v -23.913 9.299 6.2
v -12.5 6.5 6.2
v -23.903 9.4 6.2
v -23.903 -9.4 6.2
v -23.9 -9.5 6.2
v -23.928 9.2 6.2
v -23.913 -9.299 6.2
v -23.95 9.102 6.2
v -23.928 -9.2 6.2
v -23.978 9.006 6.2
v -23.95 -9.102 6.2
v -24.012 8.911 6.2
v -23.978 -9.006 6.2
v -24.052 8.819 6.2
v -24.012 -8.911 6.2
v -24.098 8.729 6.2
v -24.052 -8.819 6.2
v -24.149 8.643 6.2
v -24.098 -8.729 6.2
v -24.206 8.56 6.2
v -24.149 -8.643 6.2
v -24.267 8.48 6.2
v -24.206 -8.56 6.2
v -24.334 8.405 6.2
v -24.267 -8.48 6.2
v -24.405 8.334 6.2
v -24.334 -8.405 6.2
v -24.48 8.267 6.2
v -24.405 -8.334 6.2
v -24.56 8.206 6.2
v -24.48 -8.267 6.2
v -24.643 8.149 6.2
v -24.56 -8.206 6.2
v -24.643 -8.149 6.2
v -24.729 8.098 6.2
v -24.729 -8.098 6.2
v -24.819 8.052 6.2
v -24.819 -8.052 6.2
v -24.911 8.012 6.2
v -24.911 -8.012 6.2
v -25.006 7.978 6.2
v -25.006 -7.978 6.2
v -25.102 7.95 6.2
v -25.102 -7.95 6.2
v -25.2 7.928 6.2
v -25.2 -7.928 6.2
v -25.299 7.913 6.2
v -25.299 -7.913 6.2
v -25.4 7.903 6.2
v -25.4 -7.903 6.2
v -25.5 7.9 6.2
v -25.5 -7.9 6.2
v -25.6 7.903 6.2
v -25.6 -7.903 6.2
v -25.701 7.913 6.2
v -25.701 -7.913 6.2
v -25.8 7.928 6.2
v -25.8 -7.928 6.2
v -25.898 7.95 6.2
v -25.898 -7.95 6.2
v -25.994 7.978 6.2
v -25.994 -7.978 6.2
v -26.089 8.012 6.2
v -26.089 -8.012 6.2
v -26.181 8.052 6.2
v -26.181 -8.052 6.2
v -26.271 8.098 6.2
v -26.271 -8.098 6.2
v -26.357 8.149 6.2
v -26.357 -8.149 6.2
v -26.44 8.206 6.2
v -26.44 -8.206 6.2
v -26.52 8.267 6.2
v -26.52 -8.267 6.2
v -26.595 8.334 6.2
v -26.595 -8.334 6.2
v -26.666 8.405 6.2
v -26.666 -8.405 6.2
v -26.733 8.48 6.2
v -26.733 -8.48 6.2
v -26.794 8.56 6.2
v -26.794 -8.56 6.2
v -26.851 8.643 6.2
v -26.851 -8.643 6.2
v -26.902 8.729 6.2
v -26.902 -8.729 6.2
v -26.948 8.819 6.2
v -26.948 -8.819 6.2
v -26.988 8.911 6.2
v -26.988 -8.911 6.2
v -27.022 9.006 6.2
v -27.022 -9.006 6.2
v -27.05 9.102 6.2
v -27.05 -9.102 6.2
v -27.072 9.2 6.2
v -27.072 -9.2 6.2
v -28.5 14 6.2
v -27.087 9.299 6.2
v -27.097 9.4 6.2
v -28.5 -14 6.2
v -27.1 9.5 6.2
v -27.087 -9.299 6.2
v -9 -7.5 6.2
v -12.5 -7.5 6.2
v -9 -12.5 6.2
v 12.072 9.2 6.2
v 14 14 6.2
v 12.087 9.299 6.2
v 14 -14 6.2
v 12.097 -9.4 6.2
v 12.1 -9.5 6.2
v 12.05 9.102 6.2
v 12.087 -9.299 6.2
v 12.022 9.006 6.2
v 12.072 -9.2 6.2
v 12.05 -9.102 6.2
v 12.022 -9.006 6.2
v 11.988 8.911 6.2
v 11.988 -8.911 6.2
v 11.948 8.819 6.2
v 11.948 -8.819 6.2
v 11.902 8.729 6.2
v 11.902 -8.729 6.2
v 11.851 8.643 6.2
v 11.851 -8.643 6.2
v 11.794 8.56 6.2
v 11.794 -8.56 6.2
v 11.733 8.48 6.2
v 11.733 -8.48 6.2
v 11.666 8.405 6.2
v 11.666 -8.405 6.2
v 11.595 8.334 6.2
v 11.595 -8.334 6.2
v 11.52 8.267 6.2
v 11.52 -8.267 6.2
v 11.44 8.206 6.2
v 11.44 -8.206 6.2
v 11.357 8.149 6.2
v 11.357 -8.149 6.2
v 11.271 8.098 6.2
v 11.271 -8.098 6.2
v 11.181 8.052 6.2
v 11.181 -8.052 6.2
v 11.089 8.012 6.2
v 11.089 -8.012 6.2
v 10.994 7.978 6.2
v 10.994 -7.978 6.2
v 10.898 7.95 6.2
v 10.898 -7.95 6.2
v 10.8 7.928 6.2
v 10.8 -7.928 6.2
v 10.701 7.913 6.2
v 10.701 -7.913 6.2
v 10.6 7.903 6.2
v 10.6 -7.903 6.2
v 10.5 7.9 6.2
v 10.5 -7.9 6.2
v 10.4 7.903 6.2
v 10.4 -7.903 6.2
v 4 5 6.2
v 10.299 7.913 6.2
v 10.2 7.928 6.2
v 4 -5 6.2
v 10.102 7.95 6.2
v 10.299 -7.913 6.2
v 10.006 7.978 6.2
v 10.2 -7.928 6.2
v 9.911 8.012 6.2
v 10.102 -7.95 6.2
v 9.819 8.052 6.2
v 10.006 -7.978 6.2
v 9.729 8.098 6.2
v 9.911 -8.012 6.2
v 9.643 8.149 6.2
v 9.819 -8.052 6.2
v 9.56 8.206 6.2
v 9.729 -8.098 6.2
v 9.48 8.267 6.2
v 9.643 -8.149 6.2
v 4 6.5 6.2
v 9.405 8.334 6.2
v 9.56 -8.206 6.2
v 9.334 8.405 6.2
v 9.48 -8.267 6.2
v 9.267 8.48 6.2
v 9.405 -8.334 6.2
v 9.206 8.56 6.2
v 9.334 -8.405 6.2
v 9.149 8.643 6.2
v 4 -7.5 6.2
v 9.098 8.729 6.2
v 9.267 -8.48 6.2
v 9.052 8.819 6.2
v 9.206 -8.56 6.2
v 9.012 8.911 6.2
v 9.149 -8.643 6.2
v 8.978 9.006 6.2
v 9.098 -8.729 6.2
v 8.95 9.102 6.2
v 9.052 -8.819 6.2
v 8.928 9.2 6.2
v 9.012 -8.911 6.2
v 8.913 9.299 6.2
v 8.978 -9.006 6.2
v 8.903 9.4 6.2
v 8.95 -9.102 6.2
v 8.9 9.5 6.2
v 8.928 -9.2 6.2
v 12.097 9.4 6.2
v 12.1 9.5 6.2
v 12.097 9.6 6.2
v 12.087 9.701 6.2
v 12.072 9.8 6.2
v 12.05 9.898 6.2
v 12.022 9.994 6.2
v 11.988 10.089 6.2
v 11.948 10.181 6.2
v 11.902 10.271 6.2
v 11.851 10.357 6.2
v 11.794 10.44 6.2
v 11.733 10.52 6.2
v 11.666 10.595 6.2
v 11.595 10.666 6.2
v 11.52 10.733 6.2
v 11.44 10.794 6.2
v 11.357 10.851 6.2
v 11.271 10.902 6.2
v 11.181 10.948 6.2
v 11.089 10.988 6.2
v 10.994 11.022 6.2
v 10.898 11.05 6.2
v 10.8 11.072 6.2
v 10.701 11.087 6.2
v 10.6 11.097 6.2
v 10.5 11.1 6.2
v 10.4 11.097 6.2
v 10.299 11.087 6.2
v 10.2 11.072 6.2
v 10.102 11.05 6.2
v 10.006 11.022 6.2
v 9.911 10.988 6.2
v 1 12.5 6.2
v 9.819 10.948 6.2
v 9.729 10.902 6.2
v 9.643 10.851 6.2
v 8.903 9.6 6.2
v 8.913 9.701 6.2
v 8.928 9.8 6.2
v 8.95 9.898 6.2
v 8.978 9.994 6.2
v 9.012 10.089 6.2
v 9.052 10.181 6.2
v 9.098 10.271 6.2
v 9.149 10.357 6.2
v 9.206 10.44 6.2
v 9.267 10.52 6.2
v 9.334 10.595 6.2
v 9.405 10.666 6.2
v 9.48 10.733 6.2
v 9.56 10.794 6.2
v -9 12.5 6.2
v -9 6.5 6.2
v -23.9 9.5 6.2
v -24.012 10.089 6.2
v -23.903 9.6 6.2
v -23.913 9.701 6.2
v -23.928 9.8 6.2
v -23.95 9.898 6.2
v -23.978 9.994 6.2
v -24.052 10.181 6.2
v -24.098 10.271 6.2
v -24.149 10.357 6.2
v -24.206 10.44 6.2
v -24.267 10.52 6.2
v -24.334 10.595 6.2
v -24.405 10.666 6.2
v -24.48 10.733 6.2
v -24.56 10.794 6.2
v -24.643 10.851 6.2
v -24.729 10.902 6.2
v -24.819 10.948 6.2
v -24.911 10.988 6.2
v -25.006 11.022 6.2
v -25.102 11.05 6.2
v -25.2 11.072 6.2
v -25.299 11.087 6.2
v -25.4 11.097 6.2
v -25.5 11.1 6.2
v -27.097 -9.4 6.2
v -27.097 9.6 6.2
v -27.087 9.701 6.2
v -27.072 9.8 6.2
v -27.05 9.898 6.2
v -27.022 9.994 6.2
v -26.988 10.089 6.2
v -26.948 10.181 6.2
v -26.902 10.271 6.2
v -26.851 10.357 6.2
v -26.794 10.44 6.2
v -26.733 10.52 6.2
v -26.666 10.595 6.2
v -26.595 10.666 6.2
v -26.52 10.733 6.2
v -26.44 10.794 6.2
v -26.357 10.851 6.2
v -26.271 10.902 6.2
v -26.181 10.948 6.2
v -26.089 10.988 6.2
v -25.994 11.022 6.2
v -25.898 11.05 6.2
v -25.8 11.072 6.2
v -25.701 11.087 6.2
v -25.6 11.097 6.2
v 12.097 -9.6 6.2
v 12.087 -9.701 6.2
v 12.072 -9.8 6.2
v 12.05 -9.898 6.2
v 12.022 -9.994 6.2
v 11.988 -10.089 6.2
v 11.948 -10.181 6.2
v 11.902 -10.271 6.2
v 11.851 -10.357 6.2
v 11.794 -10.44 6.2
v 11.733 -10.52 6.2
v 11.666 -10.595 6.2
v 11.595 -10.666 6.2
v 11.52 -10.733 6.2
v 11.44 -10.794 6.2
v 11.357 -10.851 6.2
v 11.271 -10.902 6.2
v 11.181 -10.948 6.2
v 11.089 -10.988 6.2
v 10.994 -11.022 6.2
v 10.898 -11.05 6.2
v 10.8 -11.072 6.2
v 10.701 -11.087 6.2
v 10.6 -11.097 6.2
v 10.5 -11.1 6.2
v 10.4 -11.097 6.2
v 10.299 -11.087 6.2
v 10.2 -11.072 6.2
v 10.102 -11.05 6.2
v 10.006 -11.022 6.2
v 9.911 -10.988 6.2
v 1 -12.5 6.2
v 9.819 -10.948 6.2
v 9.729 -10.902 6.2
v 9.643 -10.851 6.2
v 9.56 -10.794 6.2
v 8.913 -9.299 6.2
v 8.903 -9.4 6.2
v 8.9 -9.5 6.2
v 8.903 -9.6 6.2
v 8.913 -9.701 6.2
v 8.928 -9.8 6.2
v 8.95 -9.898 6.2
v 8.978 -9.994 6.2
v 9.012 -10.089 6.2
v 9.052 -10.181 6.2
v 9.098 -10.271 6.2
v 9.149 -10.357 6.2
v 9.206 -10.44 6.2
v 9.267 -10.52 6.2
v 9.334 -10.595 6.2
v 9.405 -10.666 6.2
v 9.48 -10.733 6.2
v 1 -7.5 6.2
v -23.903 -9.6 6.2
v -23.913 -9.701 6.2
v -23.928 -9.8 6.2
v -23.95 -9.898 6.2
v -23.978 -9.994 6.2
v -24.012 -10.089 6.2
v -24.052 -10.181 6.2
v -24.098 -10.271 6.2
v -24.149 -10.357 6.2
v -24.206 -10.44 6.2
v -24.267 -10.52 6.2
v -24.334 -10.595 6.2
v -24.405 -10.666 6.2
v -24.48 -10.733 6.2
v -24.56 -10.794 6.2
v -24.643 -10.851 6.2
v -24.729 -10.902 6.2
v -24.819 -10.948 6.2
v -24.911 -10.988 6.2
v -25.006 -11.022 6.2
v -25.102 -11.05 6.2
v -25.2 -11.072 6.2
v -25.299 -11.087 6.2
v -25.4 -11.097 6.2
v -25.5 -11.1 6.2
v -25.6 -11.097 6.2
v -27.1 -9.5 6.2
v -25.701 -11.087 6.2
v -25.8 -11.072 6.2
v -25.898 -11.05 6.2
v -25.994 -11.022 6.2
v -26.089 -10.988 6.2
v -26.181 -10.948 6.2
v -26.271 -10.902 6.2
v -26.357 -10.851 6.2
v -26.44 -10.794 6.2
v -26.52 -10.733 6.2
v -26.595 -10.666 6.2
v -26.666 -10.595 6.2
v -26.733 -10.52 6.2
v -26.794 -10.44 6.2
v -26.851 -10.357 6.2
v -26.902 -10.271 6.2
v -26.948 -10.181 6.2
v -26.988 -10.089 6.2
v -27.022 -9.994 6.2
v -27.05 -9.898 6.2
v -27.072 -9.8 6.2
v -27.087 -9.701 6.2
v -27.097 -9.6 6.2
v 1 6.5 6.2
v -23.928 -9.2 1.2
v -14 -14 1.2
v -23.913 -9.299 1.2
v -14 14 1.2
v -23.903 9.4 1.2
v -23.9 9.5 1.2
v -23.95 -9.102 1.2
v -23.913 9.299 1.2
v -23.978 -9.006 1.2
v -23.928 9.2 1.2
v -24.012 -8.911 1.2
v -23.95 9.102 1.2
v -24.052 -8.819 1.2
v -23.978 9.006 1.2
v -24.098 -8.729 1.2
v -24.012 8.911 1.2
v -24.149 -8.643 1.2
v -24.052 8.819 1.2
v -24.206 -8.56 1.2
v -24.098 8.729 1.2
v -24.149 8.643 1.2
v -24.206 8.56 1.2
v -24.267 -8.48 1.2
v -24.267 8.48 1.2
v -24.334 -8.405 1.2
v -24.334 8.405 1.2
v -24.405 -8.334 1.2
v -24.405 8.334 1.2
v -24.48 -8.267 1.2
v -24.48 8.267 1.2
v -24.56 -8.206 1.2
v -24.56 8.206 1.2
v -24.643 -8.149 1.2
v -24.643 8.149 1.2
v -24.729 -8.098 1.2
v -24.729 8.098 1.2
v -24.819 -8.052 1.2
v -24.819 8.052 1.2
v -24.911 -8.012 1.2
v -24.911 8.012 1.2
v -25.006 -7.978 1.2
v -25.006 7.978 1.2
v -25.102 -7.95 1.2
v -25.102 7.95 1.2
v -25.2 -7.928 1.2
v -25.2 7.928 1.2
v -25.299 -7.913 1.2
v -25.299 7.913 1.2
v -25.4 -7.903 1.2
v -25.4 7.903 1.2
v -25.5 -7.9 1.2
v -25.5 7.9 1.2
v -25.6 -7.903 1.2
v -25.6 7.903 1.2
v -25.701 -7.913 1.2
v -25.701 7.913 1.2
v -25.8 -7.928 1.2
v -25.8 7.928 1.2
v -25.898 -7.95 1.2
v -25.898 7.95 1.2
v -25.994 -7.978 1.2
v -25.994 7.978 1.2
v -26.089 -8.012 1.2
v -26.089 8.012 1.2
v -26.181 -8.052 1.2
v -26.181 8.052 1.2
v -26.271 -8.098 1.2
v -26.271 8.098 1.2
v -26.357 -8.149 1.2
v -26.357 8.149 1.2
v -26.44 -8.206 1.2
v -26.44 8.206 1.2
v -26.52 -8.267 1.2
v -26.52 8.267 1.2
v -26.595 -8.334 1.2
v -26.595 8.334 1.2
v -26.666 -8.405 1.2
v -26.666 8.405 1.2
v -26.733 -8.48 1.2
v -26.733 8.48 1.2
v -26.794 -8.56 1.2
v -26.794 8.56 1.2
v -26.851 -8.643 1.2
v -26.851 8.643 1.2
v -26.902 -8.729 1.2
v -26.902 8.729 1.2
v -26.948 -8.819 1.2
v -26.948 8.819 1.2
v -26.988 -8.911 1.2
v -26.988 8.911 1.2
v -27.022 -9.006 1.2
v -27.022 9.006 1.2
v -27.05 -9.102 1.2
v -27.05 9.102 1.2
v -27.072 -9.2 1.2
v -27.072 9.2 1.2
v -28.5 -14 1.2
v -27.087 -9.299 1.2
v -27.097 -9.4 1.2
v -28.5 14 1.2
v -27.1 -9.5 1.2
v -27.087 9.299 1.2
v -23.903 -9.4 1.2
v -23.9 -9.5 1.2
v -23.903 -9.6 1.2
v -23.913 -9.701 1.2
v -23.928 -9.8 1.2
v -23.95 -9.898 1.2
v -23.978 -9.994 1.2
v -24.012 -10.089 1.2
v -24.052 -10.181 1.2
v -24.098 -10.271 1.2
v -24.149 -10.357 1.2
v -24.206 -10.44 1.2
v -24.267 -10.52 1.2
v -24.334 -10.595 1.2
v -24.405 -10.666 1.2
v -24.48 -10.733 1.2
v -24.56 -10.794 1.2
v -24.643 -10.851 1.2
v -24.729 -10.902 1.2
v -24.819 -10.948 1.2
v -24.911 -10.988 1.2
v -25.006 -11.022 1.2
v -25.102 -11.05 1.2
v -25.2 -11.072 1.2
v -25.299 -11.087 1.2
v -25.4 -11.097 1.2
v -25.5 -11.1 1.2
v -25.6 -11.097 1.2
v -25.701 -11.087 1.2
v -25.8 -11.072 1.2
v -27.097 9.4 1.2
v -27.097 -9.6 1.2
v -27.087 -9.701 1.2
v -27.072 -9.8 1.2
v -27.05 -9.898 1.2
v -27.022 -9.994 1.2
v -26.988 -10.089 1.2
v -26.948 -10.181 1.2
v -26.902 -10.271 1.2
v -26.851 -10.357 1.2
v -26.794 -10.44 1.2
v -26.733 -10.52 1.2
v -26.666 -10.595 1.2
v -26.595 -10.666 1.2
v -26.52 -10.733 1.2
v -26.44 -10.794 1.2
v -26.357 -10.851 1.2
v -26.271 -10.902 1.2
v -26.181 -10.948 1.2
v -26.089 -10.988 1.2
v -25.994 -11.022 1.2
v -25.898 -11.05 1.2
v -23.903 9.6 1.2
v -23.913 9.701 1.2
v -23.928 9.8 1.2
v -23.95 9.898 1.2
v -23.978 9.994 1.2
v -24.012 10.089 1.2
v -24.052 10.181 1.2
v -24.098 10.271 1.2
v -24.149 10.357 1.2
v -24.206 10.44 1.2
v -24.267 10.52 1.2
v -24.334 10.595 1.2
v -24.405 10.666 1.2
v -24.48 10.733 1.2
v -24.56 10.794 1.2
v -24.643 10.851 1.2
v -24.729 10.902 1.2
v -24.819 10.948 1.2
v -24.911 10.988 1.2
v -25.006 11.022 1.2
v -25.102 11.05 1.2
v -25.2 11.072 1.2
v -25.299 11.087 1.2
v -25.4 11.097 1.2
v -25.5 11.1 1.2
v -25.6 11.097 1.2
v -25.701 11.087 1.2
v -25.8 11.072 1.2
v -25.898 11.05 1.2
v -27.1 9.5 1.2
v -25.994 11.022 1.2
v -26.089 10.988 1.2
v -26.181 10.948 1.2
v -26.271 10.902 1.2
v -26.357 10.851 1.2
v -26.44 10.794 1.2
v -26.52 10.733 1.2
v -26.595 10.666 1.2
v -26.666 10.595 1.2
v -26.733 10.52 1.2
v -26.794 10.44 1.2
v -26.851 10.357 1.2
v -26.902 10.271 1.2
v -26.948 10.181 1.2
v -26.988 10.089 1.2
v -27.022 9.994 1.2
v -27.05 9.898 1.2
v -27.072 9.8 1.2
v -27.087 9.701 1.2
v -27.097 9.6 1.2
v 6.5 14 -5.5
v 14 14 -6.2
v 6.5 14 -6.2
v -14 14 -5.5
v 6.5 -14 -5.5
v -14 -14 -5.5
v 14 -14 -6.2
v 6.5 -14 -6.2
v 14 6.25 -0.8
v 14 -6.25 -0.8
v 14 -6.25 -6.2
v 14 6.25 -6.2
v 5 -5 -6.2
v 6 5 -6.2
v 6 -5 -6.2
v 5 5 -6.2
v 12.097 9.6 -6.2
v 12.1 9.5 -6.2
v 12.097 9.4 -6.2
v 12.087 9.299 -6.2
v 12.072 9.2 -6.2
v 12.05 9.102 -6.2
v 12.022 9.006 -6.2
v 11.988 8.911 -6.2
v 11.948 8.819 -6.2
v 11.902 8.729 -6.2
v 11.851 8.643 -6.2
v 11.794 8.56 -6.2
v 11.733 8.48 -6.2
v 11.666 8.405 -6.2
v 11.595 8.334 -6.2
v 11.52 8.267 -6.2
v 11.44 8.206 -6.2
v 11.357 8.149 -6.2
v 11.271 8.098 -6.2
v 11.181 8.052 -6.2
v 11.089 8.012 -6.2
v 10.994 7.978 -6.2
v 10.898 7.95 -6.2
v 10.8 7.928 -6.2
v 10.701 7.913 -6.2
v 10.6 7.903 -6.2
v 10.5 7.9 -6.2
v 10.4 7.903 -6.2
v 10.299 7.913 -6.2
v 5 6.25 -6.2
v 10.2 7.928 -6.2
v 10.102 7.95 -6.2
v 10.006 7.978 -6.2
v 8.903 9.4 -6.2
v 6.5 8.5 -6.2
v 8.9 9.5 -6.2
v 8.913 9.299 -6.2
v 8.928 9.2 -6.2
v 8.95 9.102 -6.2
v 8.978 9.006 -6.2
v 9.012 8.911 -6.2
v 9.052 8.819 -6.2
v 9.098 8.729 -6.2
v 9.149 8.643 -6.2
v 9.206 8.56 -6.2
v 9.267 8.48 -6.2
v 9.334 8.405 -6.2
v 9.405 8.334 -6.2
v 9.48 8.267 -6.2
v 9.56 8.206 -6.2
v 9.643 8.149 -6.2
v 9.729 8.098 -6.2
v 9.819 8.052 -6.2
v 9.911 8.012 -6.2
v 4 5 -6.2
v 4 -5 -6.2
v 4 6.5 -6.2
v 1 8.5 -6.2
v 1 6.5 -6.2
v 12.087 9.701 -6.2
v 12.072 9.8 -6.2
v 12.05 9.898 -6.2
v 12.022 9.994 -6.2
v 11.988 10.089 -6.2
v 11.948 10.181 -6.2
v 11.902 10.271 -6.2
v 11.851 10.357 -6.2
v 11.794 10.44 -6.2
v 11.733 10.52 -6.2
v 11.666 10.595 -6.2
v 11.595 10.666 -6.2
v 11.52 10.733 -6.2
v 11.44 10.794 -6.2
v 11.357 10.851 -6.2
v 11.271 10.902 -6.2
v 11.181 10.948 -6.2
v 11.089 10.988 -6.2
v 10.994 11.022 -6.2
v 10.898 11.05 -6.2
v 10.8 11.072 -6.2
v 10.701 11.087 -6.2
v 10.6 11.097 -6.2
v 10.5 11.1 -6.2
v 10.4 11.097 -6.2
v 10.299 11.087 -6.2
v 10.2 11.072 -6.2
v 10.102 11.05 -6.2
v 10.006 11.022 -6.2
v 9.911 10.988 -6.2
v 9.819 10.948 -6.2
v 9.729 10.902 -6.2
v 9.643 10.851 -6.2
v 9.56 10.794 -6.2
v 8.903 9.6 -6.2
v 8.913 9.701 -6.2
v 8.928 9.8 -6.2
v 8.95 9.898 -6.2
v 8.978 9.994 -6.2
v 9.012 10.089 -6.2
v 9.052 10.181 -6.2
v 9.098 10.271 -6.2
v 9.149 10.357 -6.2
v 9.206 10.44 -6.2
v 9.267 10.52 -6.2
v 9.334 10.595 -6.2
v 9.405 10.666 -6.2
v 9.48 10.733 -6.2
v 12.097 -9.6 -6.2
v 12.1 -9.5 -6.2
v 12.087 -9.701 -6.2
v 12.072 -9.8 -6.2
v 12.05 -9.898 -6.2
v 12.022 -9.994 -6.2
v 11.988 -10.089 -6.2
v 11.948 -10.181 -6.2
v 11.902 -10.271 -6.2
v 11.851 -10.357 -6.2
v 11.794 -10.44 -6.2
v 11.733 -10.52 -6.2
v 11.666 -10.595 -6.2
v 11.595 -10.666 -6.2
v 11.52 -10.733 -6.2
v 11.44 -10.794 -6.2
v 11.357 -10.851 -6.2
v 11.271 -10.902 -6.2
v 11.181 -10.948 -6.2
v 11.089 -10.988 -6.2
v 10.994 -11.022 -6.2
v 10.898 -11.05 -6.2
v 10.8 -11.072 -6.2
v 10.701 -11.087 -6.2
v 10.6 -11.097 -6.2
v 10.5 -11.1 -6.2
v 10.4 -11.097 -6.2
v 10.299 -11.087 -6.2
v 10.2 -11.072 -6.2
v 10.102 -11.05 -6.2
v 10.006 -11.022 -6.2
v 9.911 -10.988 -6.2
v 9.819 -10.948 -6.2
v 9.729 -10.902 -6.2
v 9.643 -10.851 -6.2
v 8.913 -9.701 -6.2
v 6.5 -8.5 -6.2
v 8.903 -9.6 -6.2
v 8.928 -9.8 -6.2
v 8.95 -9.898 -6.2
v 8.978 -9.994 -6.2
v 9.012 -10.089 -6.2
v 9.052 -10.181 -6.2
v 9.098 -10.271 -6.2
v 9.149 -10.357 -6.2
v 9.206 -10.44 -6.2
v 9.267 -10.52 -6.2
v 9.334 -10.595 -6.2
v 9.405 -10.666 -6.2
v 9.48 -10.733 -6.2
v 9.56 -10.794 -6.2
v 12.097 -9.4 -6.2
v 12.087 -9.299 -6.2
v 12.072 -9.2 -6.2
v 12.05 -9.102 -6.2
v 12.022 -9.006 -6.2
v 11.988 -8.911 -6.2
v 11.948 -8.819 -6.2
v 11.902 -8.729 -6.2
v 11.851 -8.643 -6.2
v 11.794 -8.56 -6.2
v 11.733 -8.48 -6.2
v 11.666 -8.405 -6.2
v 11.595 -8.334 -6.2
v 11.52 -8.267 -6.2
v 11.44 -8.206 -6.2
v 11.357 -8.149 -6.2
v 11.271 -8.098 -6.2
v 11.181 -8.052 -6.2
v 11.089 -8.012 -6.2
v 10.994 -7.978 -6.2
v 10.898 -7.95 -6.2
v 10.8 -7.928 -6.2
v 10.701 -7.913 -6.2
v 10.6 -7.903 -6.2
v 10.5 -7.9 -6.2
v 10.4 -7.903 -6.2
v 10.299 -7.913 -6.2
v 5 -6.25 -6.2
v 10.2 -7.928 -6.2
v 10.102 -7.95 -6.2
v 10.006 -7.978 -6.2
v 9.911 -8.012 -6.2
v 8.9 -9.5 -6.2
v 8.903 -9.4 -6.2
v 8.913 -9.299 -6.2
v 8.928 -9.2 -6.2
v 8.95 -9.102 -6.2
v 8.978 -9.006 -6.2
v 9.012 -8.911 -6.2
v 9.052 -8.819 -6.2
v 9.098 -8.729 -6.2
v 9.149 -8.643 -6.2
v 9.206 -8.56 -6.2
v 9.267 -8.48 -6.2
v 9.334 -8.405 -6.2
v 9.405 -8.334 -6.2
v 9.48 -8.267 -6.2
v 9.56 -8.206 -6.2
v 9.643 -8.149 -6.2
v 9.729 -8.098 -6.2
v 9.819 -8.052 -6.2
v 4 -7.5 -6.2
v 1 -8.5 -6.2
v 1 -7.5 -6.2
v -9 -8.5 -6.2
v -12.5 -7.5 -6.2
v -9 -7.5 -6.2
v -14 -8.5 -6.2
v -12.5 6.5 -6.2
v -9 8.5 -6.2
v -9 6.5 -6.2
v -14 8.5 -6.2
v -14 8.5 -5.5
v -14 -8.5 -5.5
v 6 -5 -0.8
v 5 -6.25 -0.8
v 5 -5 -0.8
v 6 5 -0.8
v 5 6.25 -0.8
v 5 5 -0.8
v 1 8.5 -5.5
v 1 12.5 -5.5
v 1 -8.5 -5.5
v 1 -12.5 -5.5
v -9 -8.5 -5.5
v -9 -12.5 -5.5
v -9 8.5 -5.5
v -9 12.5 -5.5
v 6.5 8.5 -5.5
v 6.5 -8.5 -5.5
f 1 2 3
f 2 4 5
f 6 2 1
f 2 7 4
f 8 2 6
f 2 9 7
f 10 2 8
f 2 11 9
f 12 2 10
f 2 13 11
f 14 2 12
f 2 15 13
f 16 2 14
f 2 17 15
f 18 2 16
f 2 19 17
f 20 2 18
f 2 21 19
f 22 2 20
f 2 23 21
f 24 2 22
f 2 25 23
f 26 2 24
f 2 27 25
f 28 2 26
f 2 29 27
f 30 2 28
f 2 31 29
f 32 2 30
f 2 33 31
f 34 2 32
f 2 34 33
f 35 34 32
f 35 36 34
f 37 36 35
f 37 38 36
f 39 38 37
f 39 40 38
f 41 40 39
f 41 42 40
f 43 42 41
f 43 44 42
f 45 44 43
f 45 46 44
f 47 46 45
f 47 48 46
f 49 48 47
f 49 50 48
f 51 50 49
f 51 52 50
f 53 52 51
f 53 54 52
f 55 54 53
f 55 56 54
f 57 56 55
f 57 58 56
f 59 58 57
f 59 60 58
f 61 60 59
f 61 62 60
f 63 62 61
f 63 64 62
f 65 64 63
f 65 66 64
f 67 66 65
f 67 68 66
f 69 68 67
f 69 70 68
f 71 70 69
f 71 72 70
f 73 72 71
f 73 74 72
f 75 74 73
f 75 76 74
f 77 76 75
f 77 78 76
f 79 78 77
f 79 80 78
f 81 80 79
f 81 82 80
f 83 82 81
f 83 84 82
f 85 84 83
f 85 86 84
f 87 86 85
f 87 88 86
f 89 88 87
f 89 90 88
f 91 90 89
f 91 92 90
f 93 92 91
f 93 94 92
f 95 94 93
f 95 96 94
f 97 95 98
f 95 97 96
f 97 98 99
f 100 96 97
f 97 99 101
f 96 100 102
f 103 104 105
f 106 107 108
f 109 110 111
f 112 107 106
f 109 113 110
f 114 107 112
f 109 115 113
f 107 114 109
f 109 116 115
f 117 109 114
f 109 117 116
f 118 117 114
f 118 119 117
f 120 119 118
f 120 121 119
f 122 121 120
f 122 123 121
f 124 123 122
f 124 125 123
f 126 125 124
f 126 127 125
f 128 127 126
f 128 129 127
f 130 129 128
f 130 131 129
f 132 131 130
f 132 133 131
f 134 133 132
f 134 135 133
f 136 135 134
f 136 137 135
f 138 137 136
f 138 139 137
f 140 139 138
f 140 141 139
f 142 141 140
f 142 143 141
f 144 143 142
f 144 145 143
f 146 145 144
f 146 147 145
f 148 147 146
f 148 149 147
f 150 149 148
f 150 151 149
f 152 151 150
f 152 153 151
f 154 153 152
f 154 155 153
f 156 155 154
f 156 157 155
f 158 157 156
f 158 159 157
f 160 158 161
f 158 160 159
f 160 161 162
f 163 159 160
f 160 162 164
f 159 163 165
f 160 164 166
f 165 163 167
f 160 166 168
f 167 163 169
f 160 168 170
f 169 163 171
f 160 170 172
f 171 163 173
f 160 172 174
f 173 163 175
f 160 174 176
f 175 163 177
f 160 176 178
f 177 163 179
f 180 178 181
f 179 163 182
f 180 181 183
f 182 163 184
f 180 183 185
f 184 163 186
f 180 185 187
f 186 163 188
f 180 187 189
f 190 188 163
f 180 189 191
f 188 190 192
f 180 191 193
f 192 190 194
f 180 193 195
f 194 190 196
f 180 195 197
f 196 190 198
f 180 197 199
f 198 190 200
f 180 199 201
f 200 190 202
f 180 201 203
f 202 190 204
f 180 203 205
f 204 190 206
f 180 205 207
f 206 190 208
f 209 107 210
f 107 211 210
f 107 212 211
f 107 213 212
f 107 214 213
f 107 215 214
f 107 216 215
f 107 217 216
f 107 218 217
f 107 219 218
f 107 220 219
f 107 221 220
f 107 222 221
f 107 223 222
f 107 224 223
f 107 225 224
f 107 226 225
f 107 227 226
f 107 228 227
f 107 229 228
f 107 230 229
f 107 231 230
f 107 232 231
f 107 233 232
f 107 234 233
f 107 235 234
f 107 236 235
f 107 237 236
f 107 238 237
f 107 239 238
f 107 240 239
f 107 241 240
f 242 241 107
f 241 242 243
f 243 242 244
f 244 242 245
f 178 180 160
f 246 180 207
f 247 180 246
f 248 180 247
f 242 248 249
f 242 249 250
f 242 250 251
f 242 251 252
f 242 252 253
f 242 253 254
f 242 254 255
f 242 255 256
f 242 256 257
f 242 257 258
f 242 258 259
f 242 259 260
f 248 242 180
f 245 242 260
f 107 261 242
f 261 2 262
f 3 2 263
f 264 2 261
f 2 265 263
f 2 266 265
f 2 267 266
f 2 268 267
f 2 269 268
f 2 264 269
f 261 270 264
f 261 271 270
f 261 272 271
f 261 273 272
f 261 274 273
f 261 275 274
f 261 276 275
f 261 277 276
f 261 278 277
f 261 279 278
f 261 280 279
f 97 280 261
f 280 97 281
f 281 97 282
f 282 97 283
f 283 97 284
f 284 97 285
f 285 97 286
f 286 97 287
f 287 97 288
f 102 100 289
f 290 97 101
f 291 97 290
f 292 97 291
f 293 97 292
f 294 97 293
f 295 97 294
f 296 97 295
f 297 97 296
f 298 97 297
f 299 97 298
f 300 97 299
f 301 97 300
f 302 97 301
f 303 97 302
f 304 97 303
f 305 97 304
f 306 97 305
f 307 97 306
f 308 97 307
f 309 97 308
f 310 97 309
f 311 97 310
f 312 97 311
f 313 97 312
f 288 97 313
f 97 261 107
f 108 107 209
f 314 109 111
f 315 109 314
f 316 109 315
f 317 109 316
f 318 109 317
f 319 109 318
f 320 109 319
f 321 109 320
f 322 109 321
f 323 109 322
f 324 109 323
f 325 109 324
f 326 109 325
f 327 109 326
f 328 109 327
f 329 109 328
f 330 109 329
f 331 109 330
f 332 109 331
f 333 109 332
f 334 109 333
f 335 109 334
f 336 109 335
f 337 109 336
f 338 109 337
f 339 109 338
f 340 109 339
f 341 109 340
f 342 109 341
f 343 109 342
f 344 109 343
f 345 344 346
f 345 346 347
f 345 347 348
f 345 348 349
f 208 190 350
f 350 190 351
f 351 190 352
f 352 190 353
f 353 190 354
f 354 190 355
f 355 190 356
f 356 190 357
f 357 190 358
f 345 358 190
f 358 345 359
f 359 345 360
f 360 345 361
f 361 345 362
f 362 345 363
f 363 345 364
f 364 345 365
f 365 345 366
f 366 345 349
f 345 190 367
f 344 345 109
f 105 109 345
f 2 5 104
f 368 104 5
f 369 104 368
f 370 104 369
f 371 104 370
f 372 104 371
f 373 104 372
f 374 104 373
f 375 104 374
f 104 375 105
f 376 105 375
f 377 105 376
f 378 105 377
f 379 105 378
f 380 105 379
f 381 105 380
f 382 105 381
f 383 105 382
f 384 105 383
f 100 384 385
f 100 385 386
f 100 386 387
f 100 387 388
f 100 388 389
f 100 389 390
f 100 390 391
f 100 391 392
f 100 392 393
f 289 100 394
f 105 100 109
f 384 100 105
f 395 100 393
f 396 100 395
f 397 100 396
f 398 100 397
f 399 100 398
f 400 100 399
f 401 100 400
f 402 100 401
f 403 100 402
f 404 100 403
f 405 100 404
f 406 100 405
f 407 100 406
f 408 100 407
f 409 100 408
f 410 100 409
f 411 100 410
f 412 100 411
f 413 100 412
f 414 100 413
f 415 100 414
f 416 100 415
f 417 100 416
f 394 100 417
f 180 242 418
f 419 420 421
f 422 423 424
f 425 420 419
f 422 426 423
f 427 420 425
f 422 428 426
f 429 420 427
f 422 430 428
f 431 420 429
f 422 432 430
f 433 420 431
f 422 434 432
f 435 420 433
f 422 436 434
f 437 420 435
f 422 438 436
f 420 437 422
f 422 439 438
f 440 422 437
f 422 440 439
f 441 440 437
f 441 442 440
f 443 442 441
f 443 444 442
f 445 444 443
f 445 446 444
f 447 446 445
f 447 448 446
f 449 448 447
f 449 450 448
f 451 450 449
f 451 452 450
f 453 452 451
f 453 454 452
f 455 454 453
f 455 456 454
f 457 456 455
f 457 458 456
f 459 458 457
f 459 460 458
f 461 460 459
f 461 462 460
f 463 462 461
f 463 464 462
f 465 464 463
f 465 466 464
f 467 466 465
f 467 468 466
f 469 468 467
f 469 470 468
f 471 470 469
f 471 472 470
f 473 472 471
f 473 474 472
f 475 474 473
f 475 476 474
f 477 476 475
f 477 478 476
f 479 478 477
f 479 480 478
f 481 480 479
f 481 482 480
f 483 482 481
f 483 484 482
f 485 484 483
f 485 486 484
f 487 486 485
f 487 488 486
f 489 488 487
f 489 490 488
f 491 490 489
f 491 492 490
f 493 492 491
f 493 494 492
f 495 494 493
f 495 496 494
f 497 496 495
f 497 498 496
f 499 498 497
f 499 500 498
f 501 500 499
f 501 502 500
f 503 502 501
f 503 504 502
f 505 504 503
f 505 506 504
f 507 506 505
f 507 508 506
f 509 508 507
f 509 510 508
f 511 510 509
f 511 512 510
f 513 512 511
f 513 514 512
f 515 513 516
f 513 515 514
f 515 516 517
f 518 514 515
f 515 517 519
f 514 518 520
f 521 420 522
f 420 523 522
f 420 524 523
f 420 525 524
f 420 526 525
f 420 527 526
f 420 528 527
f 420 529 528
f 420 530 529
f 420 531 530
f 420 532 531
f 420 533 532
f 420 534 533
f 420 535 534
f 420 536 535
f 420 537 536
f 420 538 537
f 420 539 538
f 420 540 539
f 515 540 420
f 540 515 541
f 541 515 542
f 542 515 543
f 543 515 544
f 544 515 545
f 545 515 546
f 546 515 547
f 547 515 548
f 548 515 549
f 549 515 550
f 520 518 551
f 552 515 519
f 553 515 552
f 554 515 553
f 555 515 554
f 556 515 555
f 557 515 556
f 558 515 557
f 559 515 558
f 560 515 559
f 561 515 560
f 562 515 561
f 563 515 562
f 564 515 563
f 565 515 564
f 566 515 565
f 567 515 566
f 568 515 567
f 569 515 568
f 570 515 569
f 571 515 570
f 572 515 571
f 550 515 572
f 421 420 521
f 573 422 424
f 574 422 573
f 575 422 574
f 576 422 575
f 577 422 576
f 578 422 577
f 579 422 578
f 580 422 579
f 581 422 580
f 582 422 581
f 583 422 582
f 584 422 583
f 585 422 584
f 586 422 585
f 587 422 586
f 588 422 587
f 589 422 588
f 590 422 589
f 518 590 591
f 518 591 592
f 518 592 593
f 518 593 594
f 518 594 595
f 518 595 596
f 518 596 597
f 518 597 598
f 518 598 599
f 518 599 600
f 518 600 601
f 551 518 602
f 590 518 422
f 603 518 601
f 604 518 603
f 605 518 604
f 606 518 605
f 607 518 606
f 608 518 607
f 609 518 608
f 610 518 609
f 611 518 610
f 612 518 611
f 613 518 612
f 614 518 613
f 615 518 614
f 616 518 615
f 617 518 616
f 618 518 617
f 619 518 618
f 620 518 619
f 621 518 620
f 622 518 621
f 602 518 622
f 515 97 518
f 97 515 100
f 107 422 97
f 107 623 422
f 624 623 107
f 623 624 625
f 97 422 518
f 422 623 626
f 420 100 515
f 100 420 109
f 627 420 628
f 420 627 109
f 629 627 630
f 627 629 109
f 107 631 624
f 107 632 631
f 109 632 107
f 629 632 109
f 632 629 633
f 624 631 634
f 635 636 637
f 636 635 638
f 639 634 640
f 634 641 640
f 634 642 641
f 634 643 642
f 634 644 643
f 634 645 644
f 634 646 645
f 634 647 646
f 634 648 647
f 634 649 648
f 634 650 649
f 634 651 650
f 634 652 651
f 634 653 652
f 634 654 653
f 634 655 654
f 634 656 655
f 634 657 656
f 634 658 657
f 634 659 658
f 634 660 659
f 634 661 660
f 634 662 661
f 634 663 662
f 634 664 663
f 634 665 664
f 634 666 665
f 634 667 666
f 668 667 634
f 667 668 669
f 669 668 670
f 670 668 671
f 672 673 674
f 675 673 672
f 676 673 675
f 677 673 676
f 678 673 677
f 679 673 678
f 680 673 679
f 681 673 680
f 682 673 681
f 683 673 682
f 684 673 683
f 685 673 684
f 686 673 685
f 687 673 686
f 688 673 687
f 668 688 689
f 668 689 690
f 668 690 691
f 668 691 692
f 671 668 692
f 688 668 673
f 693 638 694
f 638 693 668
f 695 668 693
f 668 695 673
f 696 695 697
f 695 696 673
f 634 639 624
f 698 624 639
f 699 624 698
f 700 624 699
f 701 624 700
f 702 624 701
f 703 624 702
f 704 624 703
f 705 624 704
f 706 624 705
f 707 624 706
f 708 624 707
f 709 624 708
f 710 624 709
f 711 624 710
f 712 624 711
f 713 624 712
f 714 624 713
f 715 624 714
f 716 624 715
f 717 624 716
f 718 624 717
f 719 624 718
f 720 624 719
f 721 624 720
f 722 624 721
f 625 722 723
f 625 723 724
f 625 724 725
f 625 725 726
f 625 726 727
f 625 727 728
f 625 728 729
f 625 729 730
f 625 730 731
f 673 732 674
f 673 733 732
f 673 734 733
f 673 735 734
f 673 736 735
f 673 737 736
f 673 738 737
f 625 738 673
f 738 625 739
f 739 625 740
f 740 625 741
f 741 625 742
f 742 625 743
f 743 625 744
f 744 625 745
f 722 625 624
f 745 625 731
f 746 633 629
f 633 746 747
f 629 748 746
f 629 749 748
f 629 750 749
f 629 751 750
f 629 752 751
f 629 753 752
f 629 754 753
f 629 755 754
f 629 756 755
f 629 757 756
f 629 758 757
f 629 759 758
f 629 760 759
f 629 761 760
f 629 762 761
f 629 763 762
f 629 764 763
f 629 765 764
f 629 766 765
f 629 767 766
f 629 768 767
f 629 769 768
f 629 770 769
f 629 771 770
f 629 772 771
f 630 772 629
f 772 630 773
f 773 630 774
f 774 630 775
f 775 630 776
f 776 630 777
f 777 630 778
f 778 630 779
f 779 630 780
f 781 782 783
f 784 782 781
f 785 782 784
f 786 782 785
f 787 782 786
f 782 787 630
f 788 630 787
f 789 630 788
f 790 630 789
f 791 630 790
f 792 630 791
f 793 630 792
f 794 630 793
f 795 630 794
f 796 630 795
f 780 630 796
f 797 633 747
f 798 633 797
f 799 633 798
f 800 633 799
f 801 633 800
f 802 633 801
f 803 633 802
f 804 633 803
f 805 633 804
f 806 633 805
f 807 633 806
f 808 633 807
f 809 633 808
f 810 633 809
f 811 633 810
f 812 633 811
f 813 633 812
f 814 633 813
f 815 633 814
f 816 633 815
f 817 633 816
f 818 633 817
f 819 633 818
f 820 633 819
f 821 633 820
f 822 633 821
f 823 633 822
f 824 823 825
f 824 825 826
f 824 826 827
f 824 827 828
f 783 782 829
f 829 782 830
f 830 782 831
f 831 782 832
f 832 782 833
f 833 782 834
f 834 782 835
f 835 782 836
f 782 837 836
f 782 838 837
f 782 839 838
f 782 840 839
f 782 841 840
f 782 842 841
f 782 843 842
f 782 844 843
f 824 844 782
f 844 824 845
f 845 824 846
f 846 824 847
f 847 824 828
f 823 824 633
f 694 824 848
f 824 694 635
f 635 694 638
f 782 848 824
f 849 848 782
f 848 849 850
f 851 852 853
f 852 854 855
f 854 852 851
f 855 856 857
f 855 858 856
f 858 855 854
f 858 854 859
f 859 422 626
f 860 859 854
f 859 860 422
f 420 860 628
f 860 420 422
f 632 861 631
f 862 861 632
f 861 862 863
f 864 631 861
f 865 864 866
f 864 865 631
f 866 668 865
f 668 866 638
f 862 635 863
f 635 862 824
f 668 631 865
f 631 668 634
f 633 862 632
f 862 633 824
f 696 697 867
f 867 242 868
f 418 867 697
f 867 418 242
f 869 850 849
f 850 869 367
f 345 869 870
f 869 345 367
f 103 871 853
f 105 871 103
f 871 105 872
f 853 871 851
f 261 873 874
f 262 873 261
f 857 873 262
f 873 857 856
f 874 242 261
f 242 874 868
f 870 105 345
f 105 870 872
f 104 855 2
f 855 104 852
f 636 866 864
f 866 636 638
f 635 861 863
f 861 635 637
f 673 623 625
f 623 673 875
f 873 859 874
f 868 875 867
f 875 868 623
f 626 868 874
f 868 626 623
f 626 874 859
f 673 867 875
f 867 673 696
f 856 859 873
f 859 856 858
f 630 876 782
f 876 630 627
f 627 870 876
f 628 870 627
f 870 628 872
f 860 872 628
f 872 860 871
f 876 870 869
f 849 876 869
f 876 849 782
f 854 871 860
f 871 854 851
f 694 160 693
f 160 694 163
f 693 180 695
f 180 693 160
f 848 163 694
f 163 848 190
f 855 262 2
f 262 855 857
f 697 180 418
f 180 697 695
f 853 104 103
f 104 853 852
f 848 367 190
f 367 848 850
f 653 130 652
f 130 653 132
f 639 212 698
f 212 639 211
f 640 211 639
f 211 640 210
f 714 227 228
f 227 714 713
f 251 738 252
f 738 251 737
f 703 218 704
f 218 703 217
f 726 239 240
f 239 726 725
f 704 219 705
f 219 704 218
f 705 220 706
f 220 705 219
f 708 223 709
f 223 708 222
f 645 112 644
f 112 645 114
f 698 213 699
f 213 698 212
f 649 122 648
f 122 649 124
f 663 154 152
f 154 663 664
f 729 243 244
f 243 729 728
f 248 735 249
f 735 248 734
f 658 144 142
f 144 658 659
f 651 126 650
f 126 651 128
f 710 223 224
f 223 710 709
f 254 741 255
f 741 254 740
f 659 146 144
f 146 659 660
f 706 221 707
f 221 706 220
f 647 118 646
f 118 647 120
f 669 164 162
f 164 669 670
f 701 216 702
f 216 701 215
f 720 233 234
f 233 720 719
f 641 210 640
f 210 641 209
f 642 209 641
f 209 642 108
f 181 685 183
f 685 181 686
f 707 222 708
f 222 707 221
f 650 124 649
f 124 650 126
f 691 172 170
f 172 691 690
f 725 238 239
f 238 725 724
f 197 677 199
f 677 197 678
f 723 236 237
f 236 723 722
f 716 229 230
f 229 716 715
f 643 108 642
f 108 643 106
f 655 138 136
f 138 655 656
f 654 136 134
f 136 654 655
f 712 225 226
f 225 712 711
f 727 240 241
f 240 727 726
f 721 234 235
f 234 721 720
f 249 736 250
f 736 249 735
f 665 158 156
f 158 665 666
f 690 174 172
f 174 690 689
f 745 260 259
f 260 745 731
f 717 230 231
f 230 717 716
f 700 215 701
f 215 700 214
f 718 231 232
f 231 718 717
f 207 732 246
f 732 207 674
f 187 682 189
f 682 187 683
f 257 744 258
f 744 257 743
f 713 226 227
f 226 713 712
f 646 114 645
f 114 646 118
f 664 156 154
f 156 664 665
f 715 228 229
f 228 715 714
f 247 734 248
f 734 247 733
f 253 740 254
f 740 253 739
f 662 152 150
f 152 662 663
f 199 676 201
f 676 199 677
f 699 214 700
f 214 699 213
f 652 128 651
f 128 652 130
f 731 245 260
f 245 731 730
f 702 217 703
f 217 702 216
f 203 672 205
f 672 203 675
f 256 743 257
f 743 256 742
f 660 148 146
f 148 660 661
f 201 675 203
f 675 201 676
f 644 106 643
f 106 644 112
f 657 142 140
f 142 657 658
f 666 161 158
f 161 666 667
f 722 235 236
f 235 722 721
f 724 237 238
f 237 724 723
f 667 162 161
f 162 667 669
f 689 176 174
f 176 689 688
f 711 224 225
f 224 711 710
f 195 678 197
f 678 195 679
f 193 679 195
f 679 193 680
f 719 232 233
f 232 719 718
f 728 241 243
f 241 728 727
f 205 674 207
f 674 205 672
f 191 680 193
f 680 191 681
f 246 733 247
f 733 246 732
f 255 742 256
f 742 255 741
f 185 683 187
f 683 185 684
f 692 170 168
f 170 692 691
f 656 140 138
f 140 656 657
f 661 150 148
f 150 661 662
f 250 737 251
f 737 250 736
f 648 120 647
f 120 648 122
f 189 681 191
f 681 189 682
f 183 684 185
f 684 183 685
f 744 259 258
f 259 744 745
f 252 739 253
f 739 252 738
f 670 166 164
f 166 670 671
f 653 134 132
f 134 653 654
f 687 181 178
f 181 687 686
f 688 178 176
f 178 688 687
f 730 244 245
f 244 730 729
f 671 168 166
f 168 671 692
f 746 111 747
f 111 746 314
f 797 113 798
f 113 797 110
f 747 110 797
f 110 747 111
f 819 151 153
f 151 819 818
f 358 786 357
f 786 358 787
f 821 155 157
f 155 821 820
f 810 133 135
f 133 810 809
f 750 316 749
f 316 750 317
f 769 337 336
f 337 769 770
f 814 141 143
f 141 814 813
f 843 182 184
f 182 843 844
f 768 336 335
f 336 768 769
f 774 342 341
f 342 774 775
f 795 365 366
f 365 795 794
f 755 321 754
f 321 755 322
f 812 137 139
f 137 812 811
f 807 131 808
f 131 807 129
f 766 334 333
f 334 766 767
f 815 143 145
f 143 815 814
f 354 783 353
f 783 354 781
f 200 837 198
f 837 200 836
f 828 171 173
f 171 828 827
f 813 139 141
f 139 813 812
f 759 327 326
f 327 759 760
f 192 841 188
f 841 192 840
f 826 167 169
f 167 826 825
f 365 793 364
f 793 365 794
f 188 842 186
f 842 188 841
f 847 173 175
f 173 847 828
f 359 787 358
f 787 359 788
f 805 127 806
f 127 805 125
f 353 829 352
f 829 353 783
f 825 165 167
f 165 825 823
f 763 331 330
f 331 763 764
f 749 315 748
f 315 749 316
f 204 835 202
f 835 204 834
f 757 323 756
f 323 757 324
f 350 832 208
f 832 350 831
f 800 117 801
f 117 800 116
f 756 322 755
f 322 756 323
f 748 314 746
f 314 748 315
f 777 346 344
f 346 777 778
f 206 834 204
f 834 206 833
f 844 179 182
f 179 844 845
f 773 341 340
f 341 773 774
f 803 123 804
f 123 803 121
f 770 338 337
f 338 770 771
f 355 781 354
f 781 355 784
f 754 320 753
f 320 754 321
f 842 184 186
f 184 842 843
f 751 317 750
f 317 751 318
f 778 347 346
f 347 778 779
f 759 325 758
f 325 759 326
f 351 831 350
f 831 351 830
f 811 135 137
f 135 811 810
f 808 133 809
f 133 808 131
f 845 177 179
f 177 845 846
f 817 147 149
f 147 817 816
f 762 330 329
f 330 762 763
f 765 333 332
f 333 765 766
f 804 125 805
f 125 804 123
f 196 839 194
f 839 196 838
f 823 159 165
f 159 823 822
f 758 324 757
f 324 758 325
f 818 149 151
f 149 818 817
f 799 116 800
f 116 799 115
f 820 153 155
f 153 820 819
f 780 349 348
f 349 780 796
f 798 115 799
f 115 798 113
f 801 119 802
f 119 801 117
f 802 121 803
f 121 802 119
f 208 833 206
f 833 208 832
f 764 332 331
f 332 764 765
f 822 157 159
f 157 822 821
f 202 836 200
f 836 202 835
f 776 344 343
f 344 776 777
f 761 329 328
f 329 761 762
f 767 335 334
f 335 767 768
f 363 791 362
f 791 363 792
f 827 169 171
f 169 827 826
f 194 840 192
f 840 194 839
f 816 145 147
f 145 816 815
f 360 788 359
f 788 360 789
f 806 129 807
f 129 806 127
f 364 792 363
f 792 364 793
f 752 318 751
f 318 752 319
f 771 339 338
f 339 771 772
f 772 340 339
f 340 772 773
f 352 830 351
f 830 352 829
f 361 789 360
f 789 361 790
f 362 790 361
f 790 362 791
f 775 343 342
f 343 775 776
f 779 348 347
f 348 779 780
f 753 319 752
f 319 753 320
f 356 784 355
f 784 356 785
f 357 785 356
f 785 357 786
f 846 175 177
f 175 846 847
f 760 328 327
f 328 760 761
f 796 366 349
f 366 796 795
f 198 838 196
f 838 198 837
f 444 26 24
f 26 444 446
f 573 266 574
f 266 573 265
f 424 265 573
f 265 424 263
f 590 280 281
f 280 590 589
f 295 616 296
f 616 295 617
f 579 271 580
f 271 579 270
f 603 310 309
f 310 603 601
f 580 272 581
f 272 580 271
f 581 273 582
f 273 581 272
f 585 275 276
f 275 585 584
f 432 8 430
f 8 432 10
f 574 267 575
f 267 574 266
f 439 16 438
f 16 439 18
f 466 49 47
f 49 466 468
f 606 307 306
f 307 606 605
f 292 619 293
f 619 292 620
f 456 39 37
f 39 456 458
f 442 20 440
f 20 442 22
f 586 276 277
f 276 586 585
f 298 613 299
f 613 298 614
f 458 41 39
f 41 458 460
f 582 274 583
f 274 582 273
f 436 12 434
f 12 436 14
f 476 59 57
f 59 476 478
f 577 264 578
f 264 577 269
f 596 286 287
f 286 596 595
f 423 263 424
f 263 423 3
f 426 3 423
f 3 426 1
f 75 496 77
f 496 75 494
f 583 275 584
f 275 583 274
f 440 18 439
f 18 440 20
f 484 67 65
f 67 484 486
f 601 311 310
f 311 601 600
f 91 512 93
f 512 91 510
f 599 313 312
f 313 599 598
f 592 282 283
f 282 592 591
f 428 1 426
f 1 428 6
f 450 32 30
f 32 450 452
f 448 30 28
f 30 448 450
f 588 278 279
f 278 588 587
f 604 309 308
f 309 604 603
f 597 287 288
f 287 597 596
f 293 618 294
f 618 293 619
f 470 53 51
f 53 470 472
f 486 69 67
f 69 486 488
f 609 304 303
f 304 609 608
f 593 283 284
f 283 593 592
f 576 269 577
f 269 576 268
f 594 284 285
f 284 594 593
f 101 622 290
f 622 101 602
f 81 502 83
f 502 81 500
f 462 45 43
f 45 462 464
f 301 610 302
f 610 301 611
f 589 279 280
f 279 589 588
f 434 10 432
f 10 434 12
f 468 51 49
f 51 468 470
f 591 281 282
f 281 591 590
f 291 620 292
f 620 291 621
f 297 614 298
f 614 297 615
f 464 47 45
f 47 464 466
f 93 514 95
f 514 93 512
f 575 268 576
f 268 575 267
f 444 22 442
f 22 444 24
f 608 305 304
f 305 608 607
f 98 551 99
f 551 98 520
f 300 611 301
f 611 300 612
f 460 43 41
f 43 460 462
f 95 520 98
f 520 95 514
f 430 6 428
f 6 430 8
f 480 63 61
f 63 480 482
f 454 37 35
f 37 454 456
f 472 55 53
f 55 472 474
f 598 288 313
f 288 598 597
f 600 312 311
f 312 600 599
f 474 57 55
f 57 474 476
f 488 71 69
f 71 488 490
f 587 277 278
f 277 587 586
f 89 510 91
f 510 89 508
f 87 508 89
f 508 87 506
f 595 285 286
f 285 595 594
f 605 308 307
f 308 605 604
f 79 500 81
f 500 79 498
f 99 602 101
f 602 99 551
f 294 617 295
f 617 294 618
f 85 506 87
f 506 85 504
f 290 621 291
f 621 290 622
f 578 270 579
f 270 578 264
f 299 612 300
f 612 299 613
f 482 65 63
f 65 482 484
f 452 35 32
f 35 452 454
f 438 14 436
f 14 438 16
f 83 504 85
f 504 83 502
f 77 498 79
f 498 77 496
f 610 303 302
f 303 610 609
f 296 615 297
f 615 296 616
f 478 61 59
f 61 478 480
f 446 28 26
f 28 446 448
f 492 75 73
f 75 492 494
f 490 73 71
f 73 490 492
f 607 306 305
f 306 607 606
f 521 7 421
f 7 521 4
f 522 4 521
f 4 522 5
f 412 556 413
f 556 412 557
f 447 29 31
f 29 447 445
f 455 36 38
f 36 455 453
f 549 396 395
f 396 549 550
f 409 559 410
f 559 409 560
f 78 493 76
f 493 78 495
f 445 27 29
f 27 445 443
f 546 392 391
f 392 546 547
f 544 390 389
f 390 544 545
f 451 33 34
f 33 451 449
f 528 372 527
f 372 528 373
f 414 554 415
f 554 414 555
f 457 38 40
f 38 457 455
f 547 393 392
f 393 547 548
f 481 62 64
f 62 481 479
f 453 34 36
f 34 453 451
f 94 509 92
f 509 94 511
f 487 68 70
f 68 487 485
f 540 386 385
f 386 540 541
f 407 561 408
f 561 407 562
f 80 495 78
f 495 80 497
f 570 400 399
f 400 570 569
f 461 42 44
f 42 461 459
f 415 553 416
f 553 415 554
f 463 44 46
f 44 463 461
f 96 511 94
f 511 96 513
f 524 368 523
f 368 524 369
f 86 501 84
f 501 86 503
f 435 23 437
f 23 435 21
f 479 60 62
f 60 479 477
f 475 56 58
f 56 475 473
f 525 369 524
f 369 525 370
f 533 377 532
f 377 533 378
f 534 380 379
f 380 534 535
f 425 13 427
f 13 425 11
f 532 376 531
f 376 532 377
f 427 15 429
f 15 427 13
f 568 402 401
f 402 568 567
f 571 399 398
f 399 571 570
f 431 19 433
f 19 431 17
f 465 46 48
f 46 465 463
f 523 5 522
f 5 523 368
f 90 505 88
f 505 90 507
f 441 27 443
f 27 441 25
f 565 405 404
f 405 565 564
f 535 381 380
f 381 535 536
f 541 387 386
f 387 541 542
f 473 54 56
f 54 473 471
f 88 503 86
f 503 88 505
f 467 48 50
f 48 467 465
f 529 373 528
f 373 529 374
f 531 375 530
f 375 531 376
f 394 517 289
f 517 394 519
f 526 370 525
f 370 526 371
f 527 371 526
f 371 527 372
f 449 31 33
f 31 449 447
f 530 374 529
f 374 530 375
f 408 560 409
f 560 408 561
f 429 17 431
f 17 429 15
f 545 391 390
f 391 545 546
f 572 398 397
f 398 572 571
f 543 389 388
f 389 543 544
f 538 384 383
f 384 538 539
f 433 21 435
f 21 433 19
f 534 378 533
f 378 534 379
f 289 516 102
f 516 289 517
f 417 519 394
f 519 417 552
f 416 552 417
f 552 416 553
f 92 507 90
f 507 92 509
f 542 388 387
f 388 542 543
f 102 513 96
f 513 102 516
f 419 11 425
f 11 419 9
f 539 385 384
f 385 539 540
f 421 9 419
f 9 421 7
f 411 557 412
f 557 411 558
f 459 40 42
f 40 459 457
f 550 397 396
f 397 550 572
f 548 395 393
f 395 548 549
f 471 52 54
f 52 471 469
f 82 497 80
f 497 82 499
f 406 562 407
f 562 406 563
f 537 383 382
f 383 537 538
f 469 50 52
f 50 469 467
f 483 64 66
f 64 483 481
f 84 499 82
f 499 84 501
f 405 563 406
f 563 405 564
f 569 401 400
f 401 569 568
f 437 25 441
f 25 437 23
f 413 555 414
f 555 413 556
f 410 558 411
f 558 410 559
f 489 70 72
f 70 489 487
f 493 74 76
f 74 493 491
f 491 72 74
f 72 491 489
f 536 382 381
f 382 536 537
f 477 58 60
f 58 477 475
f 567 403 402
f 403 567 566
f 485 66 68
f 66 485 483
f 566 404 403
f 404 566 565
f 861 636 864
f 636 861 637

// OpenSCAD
/*
 * Wolfskralle Socket Housing
 * Copyright (c) 2025 Lone Dynamics Corporation. All rights reserved.
 *
 * required hardware:
 *  - 2 x M3 x 16mm countersunk bolts
 *  - 2 x M3 nuts
 *
 */

$fn = 100;

height = 16 - 1.6 - 2;

mmx();

module mmx() {    
        
    translate([5,0,0]) cube([2,10,height], center=true);    
    
    difference() {
        
        union() {
        translate([-21,0,3.7]) cube([15,28,5], center=true);    
        cube([28,28,height], center=true);    
        }
        
        translate([10,0,-12.5+5.5]) cube([10,25/2,height], center=true);    
        
        translate([-4,0,0]) cube([10,25,15], center=true);    
        
        translate([0,0,-5]) cube([25,10,5], center=true);    
        
        translate([-5,16,-8]) cube([23,15,5], center=true);    
        translate([-5,-16,-8]) cube([23,15,5], center=true);    

        translate([-4.25,-0.5,3]) cube([16.5,14,20], center=true);
        
        //translate([-3,0,-10]) cube([19,19,20], center=true);

        translate([21/2, 12.5-3, -10]) cylinder(d=3.2, h=100);
        translate([21/2, -12.5+3, -10]) cylinder(d=3.2, h=100);
        
        translate([21/2-36, 12.5-3, -10]) cylinder(d=3.2, h=100);
        translate([21/2-36, -12.5+3, -10]) cylinder(d=3.2, h=100);
        
        cylinder(d=3.5, h=100);
        
    }
    
}
